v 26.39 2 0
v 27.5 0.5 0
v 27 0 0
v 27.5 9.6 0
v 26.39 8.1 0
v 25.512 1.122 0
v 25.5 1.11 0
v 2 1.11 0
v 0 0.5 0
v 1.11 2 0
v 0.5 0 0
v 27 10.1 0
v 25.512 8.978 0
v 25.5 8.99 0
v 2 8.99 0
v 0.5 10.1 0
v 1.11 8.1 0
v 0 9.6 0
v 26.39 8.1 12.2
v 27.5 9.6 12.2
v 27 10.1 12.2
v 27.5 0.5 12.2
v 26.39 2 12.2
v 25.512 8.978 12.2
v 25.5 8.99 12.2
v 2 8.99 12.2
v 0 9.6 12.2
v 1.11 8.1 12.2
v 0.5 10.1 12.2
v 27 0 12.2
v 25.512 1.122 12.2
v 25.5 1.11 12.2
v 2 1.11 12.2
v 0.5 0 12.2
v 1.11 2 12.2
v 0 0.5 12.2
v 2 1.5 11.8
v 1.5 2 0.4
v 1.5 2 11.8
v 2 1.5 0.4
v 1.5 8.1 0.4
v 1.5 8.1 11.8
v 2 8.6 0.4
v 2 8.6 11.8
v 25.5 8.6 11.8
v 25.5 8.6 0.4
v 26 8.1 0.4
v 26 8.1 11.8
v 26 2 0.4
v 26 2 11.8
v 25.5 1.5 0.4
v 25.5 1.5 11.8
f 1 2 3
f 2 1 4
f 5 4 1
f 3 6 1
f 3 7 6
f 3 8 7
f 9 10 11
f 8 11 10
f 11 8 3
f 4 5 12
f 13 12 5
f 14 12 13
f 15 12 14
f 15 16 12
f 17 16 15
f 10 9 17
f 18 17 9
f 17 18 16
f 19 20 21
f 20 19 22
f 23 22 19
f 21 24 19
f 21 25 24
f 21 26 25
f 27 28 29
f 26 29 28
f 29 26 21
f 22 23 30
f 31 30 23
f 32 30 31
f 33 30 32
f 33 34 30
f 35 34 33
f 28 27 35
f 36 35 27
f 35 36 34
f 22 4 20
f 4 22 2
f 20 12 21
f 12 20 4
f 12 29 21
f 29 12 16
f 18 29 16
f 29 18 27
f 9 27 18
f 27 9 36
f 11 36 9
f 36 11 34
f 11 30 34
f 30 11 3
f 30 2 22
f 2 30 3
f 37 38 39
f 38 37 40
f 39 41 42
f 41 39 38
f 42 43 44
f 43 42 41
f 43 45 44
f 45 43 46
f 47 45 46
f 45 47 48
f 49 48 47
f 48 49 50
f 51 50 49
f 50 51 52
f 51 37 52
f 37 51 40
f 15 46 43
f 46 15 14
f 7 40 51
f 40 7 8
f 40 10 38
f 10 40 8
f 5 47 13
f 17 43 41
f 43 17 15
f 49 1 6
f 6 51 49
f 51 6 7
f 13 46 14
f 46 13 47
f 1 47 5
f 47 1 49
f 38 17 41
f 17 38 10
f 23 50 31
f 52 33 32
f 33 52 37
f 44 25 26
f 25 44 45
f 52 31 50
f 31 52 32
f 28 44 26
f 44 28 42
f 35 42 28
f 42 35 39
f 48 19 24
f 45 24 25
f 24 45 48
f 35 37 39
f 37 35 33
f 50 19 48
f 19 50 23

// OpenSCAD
// created by IndiePandaaaaa

// original [mm]
thickness = 1.5;
depth = 12.2;
innerHeight = 7.1;
//innerWidth = 22.3;

// optimizations:
innerWidth = 24.5;
chamfer = 0.5;
chamferPyramid = 0.4;

module pyra(chamferPyra = 0.25) {
    polyhedron(
    points = [
        // INNER FACE
            [thickness, thickness + chamfer, chamferPyra], //0
            [thickness + chamfer, thickness, chamferPyra], //1
            [thickness + innerWidth - chamfer, thickness, chamferPyra], //2
            [thickness + innerWidth, thickness + chamfer, chamferPyra], //3
            [thickness + innerWidth, thickness + innerHeight - chamfer, chamferPyra], //4
            [thickness + innerWidth - chamfer, thickness + innerHeight, chamferPyra], //5
            [thickness + chamfer, thickness + innerHeight, chamferPyra], //6
            [thickness, thickness + innerHeight - chamfer, chamferPyra], //7
        // OUTER FACE
            [thickness - chamferPyra, thickness + chamfer, - 0.01], //8
            [thickness + chamfer, thickness - chamferPyra, - 0.01], //9
            [thickness + innerWidth - chamfer, thickness - chamferPyra, - 0.01], //10
            [thickness + innerWidth + chamferPyra, thickness + chamfer, - 0.01], //11
            [thickness + innerWidth + chamferPyra, thickness + innerHeight - chamfer, - 0.01], //12
            [thickness + innerWidth - chamfer, thickness + innerHeight + chamferPyra, - 0.01], //13
            [thickness + chamfer, thickness + innerHeight + chamferPyra, - 0.01], //14
            [thickness - chamferPyra, thickness + innerHeight - chamfer, - 0.01], //15
        ],
    faces = [
            [7, 6, 5, 4, 3, 2, 1, 0], //0
            [0, 1, 9, 8], //1
            [1, 2, 10, 9], //2
            [2, 3, 11, 10], //3
            [3, 4, 12, 11], //4
            [4, 5, 13, 12], //5
            [5, 6, 14, 13], //6
            [6, 7, 15, 14], //7
            [7, 0, 8, 15], //8
            [8, 9, 10, 11, 12, 13, 14, 15], //9
        ]
    );
}

difference() {
    linear_extrude(height = depth) {
        difference() {
            polygon([
                    [0, chamfer],
                    [chamfer, 0],
                    [thickness * 2 + innerWidth - chamfer, 0],
                    [thickness * 2 + innerWidth, chamfer],
                    [thickness * 2 + innerWidth, thickness * 2 + innerHeight - chamfer],
                    [thickness * 2 + innerWidth - chamfer, thickness * 2 + innerHeight],
                    [chamfer, thickness * 2 + innerHeight],
                    [0, thickness * 2 + innerHeight - chamfer],
                ]);
            polygon([
                    [thickness, thickness + chamfer],
                    [thickness + chamfer, thickness],
                    [thickness + innerWidth - chamfer, thickness],
                    [thickness + innerWidth, thickness + chamfer],
                    [thickness + innerWidth, thickness + innerHeight - chamfer],
                    [thickness + innerWidth - chamfer, thickness + innerHeight],
                    [thickness + chamfer, thickness + innerHeight],
                    [thickness, thickness + innerHeight - chamfer],
                ]);
        }
    }
    pyra(chamferPyramid);
    translate([innerWidth + thickness * 2, 0, depth])
        rotate([0, 180, 0]) pyra(chamferPyramid);
}
